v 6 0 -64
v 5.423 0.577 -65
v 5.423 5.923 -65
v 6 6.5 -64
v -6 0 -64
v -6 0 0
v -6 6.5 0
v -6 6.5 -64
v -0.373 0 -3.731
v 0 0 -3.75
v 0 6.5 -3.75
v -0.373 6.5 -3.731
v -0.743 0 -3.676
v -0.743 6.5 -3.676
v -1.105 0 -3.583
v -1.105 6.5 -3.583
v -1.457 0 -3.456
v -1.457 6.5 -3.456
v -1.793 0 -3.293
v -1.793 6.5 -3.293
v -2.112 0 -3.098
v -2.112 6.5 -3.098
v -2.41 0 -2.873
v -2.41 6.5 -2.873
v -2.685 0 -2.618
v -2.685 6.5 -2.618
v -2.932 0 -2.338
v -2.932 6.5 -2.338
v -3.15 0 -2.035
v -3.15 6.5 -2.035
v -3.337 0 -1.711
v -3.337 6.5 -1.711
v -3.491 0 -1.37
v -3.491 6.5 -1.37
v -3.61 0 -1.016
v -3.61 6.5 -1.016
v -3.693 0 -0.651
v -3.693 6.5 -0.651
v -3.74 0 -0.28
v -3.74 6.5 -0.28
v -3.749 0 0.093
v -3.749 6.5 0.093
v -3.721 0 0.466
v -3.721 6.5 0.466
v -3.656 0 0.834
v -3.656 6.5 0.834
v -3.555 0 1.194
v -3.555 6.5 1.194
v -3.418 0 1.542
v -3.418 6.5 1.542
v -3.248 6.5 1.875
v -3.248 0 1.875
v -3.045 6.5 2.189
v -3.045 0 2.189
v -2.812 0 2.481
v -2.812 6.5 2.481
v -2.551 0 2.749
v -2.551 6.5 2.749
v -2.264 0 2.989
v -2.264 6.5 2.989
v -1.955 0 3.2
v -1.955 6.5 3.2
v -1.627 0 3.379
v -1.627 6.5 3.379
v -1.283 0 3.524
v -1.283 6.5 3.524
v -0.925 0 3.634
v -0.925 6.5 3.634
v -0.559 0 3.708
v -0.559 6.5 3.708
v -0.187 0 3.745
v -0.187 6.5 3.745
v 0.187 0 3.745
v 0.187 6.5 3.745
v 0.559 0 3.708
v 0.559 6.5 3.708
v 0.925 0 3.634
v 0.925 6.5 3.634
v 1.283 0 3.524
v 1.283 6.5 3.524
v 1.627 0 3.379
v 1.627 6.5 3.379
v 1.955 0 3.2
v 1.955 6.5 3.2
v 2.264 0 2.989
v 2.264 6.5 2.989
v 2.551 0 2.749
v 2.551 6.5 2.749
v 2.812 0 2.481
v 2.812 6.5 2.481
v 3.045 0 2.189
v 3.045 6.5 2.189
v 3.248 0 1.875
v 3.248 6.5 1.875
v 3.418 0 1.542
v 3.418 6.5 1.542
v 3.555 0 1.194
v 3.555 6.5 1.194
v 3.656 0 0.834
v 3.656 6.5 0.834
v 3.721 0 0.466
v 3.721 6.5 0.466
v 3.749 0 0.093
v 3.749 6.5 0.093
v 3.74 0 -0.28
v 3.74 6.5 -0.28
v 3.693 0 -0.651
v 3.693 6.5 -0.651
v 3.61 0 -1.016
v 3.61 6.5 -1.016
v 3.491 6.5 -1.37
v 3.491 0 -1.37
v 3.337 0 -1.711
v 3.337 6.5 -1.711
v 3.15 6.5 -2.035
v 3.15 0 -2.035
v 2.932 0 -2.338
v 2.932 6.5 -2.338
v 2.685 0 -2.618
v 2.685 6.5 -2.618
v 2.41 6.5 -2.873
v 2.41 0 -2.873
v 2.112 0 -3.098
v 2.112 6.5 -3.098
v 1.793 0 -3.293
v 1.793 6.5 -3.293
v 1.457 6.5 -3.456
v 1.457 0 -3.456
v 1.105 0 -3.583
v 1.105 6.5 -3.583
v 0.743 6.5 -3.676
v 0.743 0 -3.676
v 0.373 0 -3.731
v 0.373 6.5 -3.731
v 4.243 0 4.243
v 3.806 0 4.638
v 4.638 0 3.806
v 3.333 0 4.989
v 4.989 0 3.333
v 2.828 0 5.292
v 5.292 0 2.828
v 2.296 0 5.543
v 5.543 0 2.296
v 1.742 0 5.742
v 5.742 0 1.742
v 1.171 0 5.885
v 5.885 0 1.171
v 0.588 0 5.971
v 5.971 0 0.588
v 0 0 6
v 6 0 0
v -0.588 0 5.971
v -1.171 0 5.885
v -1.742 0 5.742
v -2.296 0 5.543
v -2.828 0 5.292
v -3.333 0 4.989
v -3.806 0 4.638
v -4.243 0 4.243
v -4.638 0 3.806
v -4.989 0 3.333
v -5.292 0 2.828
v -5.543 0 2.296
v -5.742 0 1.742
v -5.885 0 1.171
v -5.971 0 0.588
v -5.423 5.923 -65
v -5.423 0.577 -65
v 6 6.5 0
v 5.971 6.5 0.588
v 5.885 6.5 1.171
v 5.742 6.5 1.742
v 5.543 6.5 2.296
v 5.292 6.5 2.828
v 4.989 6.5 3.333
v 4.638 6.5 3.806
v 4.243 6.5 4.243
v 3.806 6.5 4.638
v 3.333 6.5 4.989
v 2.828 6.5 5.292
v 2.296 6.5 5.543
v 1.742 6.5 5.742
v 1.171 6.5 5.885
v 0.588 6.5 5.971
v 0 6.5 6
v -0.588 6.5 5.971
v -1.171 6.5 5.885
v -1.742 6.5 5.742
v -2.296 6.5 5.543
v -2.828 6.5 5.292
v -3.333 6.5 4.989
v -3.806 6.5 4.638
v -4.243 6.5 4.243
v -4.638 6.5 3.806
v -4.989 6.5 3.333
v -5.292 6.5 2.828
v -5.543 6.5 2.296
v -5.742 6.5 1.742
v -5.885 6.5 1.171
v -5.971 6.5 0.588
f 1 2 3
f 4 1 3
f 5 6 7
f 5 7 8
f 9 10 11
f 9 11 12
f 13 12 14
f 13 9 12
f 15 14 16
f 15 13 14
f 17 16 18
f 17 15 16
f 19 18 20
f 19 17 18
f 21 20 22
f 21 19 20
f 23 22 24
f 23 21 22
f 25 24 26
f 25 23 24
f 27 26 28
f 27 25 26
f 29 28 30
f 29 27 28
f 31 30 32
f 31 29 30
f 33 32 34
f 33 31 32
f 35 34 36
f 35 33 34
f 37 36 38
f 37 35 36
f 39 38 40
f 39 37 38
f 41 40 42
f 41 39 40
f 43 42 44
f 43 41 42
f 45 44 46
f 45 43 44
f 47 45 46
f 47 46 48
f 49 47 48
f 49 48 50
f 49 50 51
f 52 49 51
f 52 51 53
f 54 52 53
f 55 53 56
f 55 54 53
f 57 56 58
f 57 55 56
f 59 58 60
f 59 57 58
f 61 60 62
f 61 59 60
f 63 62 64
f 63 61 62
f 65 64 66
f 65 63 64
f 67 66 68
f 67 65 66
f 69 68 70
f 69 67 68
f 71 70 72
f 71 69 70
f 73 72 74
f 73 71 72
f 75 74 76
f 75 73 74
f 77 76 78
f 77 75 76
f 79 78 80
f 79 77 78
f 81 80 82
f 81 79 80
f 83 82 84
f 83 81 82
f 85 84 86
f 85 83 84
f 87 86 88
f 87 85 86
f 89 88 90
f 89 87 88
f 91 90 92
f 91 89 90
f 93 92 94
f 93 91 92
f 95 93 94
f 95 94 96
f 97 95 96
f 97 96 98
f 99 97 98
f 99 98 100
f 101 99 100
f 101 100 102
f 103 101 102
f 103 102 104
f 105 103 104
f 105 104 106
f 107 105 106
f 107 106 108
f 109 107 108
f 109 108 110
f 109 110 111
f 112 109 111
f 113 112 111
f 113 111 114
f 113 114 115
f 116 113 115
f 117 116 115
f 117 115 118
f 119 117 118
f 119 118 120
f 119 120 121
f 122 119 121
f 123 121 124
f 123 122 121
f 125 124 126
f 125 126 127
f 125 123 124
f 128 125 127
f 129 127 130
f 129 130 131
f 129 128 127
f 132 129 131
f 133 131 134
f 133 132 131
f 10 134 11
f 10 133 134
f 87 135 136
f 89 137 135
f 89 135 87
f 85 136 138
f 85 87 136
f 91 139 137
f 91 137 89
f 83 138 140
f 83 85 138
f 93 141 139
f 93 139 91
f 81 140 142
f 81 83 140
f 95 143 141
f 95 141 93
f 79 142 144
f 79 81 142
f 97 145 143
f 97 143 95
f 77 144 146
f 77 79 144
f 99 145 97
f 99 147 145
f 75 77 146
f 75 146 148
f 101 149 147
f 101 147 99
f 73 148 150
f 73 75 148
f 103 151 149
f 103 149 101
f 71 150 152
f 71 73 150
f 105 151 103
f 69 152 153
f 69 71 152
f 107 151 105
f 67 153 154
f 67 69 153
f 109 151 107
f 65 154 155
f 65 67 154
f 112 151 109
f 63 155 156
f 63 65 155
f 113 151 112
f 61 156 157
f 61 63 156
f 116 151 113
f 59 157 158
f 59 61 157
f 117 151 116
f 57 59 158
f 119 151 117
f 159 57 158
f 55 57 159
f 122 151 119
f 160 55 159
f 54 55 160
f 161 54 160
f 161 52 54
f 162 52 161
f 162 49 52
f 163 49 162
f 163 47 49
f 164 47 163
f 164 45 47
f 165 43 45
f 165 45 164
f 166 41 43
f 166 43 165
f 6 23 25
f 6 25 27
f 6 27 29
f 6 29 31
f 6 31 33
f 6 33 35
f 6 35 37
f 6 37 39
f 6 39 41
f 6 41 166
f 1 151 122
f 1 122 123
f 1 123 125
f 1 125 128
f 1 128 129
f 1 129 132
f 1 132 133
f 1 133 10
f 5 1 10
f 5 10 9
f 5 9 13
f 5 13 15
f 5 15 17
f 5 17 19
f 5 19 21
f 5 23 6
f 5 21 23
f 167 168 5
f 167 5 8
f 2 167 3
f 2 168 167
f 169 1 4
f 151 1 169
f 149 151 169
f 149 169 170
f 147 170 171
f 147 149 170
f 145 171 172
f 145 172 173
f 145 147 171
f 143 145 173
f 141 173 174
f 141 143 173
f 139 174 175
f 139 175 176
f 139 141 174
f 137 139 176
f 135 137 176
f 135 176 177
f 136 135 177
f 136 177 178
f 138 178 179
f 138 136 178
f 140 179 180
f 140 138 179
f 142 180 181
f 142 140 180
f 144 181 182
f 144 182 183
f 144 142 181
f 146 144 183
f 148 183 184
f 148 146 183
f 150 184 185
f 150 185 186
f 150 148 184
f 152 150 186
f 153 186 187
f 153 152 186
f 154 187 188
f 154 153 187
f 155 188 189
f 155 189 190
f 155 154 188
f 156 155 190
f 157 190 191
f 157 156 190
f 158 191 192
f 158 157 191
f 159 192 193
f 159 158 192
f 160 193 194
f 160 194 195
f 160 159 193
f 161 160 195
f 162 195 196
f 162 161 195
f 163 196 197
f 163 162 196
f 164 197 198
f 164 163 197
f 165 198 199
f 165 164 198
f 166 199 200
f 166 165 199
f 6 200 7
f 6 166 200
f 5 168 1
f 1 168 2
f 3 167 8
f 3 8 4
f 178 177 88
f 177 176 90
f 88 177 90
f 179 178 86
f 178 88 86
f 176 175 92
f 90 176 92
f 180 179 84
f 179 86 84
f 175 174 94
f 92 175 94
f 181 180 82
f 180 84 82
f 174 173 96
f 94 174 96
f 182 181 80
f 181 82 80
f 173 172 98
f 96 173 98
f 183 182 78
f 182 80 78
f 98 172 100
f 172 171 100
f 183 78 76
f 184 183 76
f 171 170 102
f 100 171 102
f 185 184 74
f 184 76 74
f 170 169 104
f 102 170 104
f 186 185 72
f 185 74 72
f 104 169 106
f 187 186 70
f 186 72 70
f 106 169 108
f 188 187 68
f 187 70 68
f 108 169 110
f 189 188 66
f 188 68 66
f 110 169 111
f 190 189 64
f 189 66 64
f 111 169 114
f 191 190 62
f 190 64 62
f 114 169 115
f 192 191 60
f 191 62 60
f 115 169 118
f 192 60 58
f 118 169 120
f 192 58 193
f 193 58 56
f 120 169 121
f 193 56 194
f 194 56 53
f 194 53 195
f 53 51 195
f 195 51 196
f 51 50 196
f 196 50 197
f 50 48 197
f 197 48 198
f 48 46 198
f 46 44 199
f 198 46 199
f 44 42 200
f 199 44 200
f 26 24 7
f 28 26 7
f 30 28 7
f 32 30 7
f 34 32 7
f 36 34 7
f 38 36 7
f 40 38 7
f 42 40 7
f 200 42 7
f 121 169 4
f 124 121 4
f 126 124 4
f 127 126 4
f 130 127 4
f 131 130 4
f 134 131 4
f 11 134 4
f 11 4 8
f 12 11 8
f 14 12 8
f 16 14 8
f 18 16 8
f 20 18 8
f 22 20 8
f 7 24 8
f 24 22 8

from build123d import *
from OCP.BRepFilletAPI import BRepFilletAPI_MakeChamfer

# Parameters (mm, degrees)
SKETCH1_R           = 3.75
BOSS_EXTRUDE1_DEPTH = 6.5
CHAMFER1_SIZE       = 1
CHAMFER1_SIZE2      = 0.577350269


with BuildPart() as part:
    # Sketch1 → Boss-Extrude1 (new body)
    with BuildSketch(Plane(origin=(0, 0, 0), x_dir=(1, 0, 0), z_dir=(0, 1, 0))):
        with BuildLine():
            Line((-6, 0), (-6, 65))
            Line((-6, 65), (6, 65))
            Line((6, 65), (6, 0))
            ThreePointArc((6, 0), (0, -6), (-6, 0))
        make_face()
        with Locations(Location((0, 0, 0), (0, 0, 90))):
            Circle(SKETCH1_R, mode=Mode.SUBTRACT)
    extrude(amount=BOSS_EXTRUDE1_DEPTH)

    # Chamfer1: one chamfer whose edges measure the first distance from different faces: ONE call of the kernel's chamfer builder (chamfer() names one face for all edges)
    chamfer1_edges_1 = [part.edges().sort_by_distance(p)[0] for p in [
        (0, 6.5, -65),
    ]]
    chamfer1_side_1 = [part.faces().sort_by_distance(p)[0] for p in [
        (0, 6.5, -31.810895579),
    ]]
    chamfer1_edges_2 = [part.edges().sort_by_distance(p)[0] for p in [
        (0, 0, -65),
    ]]
    chamfer1_side_2 = [part.faces().sort_by_distance(p)[0] for p in [
        (0, 0, -31.810895579),
    ]]
    chamfer1_edges_3 = [part.edges().sort_by_distance(p)[0] for p in [
        (-6, 3.25, -65),
    ]]
    chamfer1_side_3 = [part.faces().sort_by_distance(p)[0] for p in [
        (-6, 3.25, -32.5),
    ]]
    chamfer1_edges_4 = [part.edges().sort_by_distance(p)[0] for p in [
        (6, 3.25, -65),
    ]]
    chamfer1_side_4 = [part.faces().sort_by_distance(p)[0] for p in [
        (6, 3.25, -32.5),
    ]]
    chamfer1 = BRepFilletAPI_MakeChamfer(part.part.solid().wrapped)
    for e in chamfer1_edges_1:
        chamfer1.Add(CHAMFER1_SIZE, CHAMFER1_SIZE2, e.wrapped, chamfer1_side_1[0].wrapped)  # the first distance lies on this face
    for e in chamfer1_edges_2:
        chamfer1.Add(CHAMFER1_SIZE, CHAMFER1_SIZE2, e.wrapped, chamfer1_side_2[0].wrapped)  # the first distance lies on this face
    for e in chamfer1_edges_3:
        chamfer1.Add(CHAMFER1_SIZE, CHAMFER1_SIZE2, e.wrapped, chamfer1_side_3[0].wrapped)  # the first distance lies on this face
    for e in chamfer1_edges_4:
        chamfer1.Add(CHAMFER1_SIZE, CHAMFER1_SIZE2, e.wrapped, chamfer1_side_4[0].wrapped)  # the first distance lies on this face
    add(Compound.cast(chamfer1.Shape()), mode=Mode.REPLACE)


solid = part.part
